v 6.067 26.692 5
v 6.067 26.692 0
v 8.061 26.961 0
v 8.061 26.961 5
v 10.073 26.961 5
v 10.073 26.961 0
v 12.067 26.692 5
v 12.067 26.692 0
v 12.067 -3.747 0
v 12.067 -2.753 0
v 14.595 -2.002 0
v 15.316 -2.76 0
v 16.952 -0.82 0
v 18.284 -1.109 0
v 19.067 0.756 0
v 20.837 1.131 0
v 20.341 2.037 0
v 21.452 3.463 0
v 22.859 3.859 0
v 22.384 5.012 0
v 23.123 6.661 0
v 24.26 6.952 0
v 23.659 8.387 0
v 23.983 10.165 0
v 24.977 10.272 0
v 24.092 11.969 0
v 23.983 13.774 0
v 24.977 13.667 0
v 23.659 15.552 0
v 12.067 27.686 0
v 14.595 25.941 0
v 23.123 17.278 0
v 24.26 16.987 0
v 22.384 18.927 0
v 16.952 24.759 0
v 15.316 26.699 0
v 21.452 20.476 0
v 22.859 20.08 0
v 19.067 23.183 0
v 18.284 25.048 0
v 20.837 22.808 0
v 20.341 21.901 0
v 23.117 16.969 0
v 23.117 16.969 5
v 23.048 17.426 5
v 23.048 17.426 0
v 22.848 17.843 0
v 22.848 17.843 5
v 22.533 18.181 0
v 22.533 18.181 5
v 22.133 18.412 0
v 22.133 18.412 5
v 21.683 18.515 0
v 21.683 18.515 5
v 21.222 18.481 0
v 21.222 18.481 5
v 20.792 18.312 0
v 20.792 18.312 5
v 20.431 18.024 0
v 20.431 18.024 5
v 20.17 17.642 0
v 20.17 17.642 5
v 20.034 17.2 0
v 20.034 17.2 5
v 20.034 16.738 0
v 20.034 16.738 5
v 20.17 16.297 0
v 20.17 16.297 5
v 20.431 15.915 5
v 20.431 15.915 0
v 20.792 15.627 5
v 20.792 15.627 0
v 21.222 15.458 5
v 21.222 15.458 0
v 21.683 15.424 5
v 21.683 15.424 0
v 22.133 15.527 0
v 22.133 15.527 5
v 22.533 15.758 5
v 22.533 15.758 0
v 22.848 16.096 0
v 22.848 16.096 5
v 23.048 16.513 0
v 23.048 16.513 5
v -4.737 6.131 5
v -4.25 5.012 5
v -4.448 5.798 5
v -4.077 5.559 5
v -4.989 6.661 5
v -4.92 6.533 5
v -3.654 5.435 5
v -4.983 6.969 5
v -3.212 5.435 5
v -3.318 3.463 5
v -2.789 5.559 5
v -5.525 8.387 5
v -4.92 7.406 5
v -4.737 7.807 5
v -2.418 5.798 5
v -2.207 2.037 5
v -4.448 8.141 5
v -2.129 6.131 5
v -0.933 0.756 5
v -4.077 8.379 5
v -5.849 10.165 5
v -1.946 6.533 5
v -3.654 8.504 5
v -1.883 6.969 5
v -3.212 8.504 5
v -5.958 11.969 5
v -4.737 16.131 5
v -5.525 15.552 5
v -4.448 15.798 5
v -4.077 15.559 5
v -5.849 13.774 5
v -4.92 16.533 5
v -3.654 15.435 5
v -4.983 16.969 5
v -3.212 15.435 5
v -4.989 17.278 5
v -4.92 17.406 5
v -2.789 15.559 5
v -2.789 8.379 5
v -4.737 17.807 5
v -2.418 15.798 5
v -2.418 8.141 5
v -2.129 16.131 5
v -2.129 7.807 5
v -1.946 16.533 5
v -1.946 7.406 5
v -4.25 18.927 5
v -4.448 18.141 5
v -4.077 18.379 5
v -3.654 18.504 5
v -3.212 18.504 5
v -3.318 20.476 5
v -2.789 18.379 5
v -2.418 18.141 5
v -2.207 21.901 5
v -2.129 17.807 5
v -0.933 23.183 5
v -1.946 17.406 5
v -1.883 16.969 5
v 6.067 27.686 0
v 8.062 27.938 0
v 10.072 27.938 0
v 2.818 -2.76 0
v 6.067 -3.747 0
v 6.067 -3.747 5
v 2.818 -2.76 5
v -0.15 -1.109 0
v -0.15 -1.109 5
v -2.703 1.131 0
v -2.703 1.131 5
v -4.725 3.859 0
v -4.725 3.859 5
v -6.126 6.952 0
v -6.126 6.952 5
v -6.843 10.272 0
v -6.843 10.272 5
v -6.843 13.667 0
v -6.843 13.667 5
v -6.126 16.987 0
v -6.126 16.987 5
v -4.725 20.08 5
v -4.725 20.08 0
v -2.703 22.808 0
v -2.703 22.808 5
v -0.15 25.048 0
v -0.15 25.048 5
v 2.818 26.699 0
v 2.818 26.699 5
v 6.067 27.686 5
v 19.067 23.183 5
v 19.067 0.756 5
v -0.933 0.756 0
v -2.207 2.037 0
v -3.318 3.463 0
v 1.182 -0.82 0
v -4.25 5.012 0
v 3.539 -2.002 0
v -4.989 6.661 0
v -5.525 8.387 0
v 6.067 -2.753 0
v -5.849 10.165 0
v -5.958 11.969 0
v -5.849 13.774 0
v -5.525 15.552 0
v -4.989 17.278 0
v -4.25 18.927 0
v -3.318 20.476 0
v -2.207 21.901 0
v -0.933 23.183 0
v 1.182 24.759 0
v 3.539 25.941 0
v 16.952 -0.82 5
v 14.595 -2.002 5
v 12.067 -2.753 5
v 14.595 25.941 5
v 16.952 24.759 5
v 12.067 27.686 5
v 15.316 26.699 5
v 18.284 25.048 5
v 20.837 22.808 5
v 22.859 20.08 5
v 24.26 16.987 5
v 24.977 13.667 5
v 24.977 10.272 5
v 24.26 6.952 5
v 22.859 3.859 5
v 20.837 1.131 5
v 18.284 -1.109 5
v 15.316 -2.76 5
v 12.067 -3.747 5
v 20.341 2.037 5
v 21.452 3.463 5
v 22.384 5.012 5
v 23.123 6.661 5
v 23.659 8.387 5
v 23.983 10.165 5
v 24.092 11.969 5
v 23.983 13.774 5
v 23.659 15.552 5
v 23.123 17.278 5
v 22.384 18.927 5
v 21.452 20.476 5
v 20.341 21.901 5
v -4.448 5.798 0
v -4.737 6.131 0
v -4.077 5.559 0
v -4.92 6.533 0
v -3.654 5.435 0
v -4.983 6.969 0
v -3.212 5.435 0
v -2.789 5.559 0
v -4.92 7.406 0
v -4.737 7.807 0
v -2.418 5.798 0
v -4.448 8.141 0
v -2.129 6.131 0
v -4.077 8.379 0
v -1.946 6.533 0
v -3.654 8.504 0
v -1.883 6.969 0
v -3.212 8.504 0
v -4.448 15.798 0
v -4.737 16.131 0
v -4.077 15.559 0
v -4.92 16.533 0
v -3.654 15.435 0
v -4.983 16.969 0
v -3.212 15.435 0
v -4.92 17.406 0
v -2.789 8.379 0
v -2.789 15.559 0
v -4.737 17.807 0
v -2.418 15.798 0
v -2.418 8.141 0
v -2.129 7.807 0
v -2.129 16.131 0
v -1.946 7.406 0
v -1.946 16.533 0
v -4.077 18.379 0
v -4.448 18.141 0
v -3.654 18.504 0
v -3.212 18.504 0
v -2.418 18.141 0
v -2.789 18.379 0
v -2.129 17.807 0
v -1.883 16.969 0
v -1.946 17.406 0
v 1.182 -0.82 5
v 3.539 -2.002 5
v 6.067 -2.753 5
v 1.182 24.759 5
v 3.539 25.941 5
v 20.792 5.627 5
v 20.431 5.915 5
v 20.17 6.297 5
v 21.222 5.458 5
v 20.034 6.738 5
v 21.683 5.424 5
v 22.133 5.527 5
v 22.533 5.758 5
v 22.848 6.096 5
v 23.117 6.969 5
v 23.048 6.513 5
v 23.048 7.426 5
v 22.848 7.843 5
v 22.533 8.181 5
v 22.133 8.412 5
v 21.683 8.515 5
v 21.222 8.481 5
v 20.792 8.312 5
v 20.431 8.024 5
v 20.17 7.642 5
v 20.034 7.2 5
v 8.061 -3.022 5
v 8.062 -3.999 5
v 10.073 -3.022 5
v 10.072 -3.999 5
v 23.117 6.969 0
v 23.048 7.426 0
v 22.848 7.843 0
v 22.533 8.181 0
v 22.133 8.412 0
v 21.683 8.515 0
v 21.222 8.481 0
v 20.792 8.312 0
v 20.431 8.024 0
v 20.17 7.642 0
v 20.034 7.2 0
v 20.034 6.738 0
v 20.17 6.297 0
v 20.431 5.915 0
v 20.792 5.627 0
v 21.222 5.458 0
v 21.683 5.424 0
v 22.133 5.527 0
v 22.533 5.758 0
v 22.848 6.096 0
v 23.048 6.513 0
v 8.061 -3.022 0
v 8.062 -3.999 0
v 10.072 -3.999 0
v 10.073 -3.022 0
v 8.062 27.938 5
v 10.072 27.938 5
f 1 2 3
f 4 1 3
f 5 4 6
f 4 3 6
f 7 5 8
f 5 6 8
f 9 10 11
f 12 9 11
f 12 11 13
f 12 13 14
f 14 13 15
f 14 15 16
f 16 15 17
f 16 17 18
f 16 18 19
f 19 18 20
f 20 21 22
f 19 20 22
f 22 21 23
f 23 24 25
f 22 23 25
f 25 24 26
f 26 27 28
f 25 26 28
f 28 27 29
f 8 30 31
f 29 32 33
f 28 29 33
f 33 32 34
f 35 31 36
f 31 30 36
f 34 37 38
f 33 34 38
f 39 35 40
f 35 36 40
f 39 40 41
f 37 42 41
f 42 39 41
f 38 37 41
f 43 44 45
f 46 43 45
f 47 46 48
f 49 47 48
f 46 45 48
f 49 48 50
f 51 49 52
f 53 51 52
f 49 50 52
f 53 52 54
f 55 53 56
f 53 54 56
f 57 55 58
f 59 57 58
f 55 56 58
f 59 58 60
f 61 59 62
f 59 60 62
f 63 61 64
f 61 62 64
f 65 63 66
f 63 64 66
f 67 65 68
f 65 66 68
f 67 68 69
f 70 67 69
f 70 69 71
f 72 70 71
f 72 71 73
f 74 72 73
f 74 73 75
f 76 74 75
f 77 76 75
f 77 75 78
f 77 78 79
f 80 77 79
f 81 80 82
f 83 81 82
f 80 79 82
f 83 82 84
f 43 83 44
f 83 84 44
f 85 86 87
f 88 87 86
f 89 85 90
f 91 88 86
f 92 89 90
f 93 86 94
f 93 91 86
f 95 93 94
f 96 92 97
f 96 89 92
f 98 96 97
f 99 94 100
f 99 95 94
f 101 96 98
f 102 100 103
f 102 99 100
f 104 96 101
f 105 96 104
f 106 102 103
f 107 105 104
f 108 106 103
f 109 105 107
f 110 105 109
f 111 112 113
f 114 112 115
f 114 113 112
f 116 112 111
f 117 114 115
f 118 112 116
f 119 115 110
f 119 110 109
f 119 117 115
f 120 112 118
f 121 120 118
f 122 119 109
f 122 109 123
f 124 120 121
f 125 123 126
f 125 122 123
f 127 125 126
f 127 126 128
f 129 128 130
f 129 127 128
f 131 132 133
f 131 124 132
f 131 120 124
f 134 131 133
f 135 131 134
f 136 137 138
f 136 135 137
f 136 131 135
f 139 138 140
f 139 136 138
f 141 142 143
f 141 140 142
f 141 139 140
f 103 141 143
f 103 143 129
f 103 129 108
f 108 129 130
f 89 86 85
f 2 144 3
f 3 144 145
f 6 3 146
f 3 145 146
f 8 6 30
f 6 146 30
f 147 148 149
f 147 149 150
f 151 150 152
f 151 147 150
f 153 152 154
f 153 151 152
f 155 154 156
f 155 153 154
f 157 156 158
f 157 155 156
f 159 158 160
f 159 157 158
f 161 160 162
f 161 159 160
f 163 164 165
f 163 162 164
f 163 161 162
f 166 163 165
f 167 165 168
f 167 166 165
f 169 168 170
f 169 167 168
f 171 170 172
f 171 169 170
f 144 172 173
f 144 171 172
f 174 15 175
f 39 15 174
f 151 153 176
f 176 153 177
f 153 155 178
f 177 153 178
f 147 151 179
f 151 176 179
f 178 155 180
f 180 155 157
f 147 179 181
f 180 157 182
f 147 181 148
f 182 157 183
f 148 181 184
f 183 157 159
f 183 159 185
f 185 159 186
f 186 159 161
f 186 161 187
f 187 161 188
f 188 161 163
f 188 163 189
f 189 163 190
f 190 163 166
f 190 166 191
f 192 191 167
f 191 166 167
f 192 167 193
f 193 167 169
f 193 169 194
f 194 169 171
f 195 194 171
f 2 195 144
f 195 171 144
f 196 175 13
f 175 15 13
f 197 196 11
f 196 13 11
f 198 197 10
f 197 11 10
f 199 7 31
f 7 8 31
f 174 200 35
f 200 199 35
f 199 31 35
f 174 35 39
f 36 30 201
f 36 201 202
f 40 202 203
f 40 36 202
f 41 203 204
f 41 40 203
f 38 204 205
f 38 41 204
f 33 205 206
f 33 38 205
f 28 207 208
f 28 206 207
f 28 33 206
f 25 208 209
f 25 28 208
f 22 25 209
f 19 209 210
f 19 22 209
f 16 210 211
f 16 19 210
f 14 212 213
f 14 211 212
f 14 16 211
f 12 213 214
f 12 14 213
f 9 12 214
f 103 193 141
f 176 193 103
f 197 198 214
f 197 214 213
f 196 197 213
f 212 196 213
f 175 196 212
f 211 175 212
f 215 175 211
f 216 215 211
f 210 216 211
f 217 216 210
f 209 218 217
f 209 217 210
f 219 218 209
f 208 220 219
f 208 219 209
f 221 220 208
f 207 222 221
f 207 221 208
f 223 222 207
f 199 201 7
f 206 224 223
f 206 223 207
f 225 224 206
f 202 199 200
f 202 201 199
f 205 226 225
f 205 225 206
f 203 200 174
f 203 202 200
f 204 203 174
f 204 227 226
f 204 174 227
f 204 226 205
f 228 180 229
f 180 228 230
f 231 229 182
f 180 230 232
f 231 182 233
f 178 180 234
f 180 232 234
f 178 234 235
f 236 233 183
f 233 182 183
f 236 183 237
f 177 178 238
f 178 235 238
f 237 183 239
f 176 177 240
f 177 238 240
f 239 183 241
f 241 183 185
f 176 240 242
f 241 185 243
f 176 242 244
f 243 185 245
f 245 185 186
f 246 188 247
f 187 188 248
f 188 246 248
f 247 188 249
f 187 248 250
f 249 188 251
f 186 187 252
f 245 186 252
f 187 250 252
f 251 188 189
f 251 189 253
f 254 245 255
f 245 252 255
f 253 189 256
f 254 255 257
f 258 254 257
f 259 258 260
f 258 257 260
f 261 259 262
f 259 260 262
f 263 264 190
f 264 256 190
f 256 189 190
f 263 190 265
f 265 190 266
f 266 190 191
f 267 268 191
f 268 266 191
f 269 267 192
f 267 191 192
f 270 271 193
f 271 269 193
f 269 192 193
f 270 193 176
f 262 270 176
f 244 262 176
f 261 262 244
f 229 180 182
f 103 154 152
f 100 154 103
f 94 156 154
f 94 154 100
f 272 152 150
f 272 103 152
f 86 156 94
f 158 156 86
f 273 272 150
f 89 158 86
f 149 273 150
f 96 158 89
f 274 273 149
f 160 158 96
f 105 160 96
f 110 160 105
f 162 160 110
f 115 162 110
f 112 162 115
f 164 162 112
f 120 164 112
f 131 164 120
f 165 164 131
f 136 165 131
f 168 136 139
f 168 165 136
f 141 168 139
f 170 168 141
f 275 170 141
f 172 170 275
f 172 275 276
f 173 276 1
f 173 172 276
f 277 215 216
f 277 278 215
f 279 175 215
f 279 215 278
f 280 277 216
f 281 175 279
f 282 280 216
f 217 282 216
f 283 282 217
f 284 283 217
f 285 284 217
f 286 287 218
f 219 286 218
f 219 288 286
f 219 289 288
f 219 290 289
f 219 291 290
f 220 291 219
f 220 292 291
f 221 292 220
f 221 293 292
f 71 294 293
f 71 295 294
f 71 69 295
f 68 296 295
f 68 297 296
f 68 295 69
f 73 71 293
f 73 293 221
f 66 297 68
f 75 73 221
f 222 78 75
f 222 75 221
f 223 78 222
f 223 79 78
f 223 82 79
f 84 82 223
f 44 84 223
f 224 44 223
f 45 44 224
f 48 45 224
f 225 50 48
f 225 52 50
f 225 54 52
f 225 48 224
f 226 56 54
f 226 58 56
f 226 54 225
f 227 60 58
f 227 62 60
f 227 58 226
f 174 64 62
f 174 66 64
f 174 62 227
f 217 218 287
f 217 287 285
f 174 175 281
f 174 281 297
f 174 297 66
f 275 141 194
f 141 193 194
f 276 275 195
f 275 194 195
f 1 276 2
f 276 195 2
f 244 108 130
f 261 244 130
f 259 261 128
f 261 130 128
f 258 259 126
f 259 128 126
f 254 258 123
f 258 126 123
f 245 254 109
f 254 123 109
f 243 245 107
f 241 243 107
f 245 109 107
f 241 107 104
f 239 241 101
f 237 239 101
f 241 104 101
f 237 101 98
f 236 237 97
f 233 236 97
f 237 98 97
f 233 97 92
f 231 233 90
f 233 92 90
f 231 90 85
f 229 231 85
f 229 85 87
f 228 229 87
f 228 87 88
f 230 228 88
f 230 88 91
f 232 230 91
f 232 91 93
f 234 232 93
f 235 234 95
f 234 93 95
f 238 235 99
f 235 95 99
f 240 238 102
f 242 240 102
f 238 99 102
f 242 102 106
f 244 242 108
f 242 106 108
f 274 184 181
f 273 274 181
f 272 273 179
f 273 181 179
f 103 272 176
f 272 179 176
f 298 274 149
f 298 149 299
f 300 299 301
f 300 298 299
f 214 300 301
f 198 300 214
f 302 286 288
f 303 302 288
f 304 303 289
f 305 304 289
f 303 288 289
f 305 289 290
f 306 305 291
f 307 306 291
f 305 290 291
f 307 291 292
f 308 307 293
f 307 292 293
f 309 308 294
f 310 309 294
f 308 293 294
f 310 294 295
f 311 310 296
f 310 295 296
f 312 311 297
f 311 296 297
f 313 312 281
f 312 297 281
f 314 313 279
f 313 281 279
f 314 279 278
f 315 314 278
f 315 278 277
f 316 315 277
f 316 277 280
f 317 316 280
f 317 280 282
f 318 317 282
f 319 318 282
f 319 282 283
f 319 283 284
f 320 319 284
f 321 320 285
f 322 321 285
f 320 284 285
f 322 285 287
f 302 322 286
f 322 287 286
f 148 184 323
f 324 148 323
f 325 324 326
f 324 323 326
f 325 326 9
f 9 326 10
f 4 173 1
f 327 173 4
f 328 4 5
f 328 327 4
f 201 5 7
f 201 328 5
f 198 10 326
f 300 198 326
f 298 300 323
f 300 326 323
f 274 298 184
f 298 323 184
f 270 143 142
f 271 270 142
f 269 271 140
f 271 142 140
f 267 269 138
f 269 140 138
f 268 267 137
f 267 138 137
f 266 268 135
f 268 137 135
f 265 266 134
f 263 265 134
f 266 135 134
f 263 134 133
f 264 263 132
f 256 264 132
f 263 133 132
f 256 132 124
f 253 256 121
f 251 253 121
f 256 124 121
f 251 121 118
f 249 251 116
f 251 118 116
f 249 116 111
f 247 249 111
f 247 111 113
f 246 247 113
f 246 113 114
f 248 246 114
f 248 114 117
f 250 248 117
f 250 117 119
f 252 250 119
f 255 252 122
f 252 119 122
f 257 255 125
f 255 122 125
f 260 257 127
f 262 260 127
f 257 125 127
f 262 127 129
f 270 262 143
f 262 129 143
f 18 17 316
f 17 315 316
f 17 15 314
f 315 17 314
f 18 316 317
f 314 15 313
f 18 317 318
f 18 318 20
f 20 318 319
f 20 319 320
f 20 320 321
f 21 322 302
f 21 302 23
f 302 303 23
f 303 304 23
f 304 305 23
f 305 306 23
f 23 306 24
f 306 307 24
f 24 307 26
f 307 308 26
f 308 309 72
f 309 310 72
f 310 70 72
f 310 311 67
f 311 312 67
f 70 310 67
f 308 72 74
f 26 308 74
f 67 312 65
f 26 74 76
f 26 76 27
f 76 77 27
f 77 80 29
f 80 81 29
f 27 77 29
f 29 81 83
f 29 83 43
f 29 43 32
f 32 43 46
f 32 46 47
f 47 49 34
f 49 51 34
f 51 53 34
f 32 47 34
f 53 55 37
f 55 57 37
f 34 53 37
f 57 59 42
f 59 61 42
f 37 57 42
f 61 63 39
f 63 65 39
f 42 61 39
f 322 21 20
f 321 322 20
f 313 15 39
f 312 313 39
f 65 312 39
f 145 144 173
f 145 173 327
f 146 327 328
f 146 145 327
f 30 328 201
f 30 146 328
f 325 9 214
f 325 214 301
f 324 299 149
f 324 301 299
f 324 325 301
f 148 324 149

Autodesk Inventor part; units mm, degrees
ref_plane "YZ Plane" through (0, 0, 0) normal (1, 0, 0) x (0, 1, 0)
ref_plane "XZ Plane" through (0, 0, 0) normal (0, 1, 0) x (-1, 0, 0)
ref_plane "XY Plane" through (0, 0, 0) normal (0, 0, 1) x (1, 0, 0)
sketch "Sketch1" plane through (0, 0, 0) normal (0, 0, 1) x (1, 0, 0)
  line L0 (19.067, 0.7556) -> (19.067, 23.1833)
  arc A0 (19.067, 0.7556) -> (19.067, 23.1833) centre (9.067, 11.9694) ccw
  line L1 (-0.933, 23.1833) -> (-0.933, 0.7556)
  arc A1 (-0.933, 23.1833) -> (-0.933, 0.7556) centre (9.067, 11.9694) ccw
  line L2 (12.067, -2.753) -> (12.067, -3.7468)
  arc A2 (12.067, -3.7468) -> (12.067, 27.6857) centre (9.067, 11.9694) ccw
  line L3 (12.067, 27.6857) -> (12.067, 26.6919)
  arc A3 (12.067, -2.753) -> (12.067, 26.6919) centre (9.067, 11.9694) ccw
  line L4 (6.067, -3.7468) -> (6.067, -2.753)
  arc A4 (6.067, 26.6919) -> (6.067, -2.753) centre (9.067, 11.9694) ccw
  line L5 (6.067, 26.6919) -> (6.067, 27.6857)
  arc A5 (6.067, 27.6857) -> (6.067, -3.7468) centre (9.067, 11.9694) ccw
  arc A6 (12.067, 27.6857) -> (6.067, 27.6857) centre (9.067, 11.9694) ccw
  arc A7 (6.067, -3.7468) -> (12.067, -3.7468) centre (9.067, 11.9694) ccw
  circle A8 centre (9.067, 11.9694) radius 15.025
  point P0 (12.067, -2.753)
  point P1 (6.067, -2.753)
extrude "Extrusion1" add sketch "Sketch1" along normal blind 5 contours L0 A0 | A0 A3 L3 A2 L2 | L2 A7 L4 A8 | A8 L5 A6 L3 | L4 A5 L5 A4 A1 | A1 L1
sketch "Sketch2" plane through (9.067, 11.9694, 5) normal (0, 0, 1) x (1, 0, 0)
  circle A0 centre (12.5, 5) radius 1.55
  circle A1 centre (12.5, -5) radius 1.55
  circle A2 centre (-12.5, -5) radius 1.55
  circle A3 centre (-12.5, 5) radius 1.55
  circle A4 centre (0, 0) radius 16 projected
  point P0 (-9.067, -11.9694)
extrude "Extrusion2" cut sketch "Sketch2" against normal through all contours A0 | A1 | A2 | A3
properties part number "arm_head_back"
